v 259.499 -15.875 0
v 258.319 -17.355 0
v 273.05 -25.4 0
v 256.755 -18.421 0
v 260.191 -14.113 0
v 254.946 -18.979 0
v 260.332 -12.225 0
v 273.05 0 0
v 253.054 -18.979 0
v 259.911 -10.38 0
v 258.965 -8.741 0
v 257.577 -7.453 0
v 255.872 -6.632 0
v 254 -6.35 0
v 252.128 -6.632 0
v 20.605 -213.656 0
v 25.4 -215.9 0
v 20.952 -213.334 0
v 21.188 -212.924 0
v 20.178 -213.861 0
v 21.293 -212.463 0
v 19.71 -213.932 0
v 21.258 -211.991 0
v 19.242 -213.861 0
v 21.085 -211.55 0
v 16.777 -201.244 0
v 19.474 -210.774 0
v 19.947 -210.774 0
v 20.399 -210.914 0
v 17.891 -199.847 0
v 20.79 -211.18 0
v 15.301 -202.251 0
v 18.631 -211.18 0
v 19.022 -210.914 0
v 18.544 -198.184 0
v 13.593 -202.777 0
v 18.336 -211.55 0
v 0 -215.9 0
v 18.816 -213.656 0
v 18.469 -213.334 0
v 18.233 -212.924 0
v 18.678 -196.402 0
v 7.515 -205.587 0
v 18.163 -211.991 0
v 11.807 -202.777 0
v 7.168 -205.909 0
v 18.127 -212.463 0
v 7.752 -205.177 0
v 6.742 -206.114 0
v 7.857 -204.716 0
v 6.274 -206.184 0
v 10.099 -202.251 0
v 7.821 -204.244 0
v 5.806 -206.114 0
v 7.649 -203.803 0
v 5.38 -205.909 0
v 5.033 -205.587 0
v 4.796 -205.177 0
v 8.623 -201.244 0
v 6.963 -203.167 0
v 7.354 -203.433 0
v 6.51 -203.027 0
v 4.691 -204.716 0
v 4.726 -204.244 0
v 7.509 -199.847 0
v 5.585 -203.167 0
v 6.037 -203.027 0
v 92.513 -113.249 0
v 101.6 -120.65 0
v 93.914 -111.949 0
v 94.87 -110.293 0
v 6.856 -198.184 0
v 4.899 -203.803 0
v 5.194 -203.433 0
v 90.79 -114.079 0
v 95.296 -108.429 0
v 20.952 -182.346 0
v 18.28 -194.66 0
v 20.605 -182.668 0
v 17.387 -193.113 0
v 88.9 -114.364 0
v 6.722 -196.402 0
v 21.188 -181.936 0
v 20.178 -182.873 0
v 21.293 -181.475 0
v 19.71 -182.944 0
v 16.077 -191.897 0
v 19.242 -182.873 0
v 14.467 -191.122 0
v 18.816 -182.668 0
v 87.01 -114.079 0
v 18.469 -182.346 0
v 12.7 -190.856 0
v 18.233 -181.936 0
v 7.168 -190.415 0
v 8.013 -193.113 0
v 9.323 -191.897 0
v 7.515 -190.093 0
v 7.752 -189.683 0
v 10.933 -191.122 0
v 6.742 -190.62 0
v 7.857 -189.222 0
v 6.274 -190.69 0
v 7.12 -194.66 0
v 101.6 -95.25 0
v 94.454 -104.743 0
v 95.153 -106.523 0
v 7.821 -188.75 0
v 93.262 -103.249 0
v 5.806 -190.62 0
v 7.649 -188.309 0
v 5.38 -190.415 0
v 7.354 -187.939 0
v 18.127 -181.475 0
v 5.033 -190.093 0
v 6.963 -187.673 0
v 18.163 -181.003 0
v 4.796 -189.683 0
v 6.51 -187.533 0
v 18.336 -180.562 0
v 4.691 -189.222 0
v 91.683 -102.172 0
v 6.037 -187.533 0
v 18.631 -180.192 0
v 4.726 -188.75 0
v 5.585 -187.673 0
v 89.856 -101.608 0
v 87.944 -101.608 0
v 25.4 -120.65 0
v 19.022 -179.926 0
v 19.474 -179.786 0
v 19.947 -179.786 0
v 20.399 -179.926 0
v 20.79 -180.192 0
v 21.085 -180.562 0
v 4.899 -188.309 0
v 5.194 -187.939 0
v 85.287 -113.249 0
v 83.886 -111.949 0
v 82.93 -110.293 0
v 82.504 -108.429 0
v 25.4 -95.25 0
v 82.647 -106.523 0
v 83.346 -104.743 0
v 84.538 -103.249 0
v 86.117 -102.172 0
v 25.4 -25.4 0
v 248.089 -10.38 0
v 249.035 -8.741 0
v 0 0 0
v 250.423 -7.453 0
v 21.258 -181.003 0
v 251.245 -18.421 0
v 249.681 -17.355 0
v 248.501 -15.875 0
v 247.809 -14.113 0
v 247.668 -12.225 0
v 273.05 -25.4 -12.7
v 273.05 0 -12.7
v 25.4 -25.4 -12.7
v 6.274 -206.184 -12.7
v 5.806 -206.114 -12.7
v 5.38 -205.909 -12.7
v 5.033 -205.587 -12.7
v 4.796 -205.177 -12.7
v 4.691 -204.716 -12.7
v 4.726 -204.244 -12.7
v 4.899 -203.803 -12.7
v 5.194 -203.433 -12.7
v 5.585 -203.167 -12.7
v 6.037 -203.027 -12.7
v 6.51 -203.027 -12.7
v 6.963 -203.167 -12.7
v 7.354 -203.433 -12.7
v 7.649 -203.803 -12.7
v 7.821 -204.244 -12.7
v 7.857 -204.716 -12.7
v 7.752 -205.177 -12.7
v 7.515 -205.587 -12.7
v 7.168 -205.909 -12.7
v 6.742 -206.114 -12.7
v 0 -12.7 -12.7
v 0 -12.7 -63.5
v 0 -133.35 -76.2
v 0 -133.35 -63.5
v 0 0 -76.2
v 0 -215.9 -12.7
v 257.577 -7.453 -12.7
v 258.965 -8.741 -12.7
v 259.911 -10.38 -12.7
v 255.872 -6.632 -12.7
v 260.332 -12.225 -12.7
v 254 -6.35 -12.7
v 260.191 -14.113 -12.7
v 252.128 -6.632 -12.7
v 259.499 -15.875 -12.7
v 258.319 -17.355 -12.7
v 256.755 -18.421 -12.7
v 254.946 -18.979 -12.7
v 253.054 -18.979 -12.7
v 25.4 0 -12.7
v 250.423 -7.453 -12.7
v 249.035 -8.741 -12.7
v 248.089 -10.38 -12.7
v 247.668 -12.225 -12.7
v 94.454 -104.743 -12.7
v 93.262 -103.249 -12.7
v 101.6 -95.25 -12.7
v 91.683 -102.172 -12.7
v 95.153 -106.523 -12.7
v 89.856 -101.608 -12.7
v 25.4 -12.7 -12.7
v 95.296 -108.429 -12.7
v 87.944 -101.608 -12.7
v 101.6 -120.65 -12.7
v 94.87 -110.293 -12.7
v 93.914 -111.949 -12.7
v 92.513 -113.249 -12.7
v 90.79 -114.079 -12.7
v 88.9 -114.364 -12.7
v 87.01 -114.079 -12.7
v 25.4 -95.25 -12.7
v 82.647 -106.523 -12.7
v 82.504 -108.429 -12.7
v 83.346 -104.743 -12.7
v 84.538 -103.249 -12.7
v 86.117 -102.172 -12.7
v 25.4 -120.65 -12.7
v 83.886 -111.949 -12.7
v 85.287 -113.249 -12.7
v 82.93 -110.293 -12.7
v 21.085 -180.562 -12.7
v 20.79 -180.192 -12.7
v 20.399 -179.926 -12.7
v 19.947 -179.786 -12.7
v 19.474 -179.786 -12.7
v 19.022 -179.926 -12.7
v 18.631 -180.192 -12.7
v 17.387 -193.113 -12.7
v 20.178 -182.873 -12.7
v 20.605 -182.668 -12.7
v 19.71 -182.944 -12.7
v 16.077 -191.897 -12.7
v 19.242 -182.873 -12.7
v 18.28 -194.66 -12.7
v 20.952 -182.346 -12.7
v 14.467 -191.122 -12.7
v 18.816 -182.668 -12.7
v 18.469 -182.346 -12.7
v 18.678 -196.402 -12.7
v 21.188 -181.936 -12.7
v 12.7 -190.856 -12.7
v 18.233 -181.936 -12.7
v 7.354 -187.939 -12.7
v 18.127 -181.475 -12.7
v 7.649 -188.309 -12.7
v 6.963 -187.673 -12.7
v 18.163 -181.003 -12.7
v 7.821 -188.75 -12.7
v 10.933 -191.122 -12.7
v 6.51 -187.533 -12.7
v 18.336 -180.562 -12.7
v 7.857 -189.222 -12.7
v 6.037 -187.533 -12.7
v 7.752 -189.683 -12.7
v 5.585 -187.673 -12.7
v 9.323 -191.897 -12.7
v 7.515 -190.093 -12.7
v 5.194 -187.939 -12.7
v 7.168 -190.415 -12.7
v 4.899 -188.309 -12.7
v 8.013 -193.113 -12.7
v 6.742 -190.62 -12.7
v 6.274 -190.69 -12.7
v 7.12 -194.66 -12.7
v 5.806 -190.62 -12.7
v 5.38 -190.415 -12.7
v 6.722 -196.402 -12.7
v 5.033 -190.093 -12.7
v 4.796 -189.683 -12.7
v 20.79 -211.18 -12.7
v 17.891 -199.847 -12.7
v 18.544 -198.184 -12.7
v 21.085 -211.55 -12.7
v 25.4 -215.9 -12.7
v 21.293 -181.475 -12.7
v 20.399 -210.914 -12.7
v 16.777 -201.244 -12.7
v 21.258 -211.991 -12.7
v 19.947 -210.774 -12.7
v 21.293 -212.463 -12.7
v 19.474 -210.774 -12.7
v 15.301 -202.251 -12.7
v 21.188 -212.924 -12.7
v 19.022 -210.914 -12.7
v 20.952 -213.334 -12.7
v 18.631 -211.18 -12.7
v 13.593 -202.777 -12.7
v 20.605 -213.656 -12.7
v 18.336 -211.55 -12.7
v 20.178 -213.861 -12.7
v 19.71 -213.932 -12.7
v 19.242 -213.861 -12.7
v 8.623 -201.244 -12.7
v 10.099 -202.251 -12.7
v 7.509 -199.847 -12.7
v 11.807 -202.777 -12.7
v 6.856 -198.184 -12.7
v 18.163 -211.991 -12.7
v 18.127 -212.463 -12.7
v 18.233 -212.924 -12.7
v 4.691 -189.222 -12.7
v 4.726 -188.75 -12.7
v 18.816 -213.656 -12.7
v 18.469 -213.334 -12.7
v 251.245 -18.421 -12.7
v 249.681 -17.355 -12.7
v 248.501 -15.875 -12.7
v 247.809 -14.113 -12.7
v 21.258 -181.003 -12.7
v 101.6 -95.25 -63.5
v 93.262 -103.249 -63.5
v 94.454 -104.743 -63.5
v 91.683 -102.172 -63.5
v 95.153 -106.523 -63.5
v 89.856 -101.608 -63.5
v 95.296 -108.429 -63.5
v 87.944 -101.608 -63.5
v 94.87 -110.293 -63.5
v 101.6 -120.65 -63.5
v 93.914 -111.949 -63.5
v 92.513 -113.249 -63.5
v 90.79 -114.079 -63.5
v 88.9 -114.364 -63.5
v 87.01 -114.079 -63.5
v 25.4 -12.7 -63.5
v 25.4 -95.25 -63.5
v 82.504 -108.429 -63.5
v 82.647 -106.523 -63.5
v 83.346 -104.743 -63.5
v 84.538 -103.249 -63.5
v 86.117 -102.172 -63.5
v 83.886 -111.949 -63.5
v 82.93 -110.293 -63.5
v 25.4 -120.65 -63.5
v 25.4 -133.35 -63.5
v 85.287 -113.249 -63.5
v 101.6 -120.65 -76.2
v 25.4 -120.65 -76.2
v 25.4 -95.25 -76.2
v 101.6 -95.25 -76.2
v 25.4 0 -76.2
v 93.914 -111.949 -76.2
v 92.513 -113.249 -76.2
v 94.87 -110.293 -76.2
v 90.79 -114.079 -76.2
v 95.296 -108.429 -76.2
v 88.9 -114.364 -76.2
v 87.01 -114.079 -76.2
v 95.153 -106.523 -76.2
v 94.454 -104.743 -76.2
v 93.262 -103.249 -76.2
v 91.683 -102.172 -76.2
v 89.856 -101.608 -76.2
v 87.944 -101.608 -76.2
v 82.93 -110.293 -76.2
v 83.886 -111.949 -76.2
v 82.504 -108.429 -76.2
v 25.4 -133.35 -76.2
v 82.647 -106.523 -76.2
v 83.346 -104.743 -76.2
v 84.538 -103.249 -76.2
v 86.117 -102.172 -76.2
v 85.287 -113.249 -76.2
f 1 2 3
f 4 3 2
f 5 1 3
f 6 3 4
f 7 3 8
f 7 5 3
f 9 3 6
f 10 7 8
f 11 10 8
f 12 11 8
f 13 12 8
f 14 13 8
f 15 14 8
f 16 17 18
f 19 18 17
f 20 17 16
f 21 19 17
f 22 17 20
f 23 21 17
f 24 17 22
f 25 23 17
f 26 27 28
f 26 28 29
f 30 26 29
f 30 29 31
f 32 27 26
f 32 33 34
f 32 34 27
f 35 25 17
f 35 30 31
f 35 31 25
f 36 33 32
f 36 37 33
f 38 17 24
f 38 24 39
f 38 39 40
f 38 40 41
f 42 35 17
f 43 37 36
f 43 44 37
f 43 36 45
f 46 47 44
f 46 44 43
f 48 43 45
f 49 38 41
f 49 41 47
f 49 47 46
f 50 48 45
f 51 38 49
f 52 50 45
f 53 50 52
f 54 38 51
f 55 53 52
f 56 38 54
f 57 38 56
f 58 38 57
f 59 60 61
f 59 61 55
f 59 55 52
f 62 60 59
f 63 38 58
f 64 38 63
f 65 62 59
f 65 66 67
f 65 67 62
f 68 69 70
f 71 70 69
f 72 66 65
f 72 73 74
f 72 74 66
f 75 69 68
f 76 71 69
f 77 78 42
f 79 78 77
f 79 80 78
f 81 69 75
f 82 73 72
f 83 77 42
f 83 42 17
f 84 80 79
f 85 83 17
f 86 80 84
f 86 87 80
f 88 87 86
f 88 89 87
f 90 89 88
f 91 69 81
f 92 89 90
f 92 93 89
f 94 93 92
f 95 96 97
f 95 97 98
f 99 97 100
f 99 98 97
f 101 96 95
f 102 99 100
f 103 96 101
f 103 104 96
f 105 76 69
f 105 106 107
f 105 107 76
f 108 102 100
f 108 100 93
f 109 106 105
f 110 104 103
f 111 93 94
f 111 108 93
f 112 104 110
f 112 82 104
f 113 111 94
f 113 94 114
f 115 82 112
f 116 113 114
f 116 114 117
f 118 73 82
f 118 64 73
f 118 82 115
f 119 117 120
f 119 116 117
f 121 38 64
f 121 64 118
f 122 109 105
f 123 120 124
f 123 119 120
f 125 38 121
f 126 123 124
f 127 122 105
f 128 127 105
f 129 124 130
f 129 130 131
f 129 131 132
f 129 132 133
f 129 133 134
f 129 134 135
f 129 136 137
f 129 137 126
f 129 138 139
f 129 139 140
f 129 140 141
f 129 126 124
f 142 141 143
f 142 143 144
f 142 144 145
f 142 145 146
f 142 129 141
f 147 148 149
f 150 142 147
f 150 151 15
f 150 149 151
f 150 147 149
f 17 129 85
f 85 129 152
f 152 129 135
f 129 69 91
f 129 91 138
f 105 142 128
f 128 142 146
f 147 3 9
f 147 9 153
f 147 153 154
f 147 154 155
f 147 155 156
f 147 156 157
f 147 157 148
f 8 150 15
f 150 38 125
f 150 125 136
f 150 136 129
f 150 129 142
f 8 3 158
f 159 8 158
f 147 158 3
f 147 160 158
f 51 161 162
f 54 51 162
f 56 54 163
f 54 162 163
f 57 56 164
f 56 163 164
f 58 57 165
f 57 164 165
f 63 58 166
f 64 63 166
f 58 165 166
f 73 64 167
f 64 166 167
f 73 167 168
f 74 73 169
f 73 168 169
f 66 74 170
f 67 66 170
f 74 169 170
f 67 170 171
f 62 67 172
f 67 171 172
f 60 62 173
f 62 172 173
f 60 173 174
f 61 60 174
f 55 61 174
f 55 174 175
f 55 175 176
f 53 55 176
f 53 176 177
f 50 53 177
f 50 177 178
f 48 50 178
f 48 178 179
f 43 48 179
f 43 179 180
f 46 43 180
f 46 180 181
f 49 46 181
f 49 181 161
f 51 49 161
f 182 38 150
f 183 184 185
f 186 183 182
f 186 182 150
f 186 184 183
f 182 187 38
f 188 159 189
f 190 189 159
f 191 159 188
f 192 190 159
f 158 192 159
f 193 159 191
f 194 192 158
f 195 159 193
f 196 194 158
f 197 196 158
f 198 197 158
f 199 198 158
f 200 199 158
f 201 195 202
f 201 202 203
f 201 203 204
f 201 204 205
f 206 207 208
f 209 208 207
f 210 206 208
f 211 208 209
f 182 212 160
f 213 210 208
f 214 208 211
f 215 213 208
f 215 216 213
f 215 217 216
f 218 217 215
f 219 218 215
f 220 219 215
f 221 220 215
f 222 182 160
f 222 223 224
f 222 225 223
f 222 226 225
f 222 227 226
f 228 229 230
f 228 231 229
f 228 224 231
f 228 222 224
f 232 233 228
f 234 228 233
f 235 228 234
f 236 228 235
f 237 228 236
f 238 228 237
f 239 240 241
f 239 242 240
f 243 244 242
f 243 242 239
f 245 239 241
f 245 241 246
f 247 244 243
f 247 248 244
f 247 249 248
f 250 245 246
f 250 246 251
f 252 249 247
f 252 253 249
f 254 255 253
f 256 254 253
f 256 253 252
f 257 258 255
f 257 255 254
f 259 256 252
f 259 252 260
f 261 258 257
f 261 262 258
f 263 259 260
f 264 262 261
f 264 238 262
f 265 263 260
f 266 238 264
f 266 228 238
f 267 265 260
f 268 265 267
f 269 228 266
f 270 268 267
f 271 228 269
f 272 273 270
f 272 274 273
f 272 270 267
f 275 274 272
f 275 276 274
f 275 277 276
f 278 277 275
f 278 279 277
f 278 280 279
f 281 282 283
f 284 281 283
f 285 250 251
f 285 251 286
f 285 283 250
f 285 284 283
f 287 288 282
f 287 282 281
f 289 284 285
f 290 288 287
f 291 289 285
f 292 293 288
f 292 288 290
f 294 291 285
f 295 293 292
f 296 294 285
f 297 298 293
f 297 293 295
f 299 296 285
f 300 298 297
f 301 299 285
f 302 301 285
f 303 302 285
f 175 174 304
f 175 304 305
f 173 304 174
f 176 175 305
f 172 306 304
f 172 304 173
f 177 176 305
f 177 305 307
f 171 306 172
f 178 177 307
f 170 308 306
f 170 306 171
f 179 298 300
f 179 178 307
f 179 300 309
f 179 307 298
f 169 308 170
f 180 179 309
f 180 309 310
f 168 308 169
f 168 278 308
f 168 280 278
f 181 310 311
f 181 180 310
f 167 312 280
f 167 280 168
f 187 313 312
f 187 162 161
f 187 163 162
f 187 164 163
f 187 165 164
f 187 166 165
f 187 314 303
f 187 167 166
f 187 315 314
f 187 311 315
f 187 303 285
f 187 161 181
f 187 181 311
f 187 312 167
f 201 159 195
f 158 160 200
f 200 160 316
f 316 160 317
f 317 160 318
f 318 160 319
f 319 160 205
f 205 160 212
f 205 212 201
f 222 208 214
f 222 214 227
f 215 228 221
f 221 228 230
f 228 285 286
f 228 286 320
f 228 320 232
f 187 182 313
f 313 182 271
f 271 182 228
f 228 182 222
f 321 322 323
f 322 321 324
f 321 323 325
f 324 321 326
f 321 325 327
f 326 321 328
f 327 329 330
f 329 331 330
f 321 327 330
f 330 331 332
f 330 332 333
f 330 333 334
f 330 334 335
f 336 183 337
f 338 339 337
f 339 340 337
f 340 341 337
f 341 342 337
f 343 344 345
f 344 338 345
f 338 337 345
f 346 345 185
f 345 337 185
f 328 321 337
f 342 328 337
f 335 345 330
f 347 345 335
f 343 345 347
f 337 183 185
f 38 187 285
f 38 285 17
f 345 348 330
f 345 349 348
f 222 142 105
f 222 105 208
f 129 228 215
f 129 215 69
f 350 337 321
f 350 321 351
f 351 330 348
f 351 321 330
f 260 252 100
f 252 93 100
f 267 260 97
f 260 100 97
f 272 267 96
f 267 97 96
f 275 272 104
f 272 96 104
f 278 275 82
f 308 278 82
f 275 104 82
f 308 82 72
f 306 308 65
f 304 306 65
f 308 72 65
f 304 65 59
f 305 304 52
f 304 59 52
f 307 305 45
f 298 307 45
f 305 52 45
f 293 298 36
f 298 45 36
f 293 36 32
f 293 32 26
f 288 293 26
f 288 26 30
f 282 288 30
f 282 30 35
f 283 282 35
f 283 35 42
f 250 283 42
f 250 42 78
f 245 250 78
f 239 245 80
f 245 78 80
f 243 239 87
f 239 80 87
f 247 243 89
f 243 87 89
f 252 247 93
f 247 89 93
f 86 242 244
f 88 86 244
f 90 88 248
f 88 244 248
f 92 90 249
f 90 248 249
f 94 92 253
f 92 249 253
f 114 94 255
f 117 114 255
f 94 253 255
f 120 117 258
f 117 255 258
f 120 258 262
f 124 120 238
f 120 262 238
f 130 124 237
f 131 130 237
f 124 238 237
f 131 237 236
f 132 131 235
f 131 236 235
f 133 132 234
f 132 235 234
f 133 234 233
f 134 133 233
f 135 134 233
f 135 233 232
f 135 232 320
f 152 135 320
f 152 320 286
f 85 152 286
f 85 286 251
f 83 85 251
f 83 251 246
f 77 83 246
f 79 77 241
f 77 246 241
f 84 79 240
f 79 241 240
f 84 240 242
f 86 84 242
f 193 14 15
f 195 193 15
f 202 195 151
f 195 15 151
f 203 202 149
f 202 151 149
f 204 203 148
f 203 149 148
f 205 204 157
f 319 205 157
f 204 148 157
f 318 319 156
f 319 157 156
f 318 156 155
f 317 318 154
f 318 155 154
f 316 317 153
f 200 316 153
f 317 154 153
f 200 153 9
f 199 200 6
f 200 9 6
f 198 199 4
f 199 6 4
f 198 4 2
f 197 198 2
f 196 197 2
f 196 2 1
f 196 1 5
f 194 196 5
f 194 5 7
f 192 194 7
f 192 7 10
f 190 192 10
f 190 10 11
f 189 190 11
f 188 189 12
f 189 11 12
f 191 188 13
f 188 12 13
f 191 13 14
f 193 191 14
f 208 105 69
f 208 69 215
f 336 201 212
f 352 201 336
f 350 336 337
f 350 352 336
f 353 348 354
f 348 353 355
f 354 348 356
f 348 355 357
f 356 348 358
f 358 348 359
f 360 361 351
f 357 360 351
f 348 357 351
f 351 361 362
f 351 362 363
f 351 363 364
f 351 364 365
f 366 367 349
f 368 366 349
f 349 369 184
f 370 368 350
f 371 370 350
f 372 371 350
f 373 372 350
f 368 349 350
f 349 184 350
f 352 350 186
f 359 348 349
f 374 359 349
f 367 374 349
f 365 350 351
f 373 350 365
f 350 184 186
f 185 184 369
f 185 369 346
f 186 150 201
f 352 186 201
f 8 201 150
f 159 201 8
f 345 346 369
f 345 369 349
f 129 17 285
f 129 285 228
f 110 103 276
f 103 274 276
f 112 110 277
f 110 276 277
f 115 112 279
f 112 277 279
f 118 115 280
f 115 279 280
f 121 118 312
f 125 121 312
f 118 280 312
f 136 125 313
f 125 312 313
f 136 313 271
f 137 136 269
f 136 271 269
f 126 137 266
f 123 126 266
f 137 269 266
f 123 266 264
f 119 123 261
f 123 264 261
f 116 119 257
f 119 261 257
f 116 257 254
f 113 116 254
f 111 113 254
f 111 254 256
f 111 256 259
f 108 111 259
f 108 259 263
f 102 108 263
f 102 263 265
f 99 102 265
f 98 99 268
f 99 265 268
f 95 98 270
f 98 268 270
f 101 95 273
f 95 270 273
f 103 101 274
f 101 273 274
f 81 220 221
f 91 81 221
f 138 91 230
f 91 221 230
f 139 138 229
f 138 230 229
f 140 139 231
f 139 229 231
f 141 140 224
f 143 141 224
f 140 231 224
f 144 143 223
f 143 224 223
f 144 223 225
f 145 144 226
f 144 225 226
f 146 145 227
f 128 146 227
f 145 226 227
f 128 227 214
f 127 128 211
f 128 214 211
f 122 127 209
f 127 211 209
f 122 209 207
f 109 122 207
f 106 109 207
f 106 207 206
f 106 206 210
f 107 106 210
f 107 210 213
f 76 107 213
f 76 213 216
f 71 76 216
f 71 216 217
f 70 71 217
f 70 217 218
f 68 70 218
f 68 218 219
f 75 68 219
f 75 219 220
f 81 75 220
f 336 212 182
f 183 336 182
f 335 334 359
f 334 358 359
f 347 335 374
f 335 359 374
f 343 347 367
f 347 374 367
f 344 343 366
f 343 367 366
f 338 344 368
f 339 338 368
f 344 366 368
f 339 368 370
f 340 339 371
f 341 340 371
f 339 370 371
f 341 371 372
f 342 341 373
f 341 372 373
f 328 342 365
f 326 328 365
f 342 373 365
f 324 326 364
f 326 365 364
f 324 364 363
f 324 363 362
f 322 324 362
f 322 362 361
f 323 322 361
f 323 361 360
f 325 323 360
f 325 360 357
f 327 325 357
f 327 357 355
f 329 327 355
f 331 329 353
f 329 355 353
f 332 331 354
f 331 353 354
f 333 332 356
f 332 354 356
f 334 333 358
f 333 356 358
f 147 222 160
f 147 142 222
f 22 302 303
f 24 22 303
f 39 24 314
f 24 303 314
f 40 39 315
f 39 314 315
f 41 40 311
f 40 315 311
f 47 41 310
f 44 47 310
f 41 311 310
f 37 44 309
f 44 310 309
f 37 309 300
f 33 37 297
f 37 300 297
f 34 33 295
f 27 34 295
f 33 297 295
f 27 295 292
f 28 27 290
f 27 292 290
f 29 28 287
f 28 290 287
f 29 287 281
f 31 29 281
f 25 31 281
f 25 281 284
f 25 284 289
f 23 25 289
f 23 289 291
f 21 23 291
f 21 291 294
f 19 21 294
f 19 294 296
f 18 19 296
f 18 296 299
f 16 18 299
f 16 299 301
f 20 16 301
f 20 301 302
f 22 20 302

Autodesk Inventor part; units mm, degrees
ref_plane "YZ Plane" through (0, 0, 0) normal (1, 0, 0) x (0, 1, 0)
ref_plane "XZ Plane" through (0, 0, 0) normal (0, 1, 0) x (-1, 0, 0)
sketch "Sketch1" plane through (0, 0, 0) normal (1, 0, 0) x (0, 1, 0)
  line L0 (0, 0) -> (-228.6, 0)
  line L1 (-228.6, 0) -> (-228.6, -12.7)
  line L2 (-228.6, -12.7) -> (0, -12.7)
  line L3 (0, -12.7) -> (0, 0)
  line L4 (0, -12.7) -> (-88.9, -12.7)
  line L5 (-88.9, -63.5) -> (0, -63.5)
  line L6 (0, -63.5) -> (-228.6, -63.5)
  line L7 (-228.6, -63.5) -> (-228.6, -76.2)
  line L8 (-228.6, -76.2) -> (0, -76.2)
  line L9 (0, -76.2) -> (0, -63.5)
  line L10 (-228.6, 0) -> (-215.9, 0)
  line L11 (-215.9, 0) -> (-215.9, -76.2)
  line L12 (-215.9, -76.2) -> (-228.6, -76.2)
  line L13 (-228.6, -76.2) -> (-228.6, 0)
  dimension "d1" = 12.7
  dimension "d4" = 12.7
  dimension "d63" = 12.7
  dimension "d64" = 228.6
  dimension "d65" = 228.6
  dimension "d66" = 50.8
extrude "Extrusion1" add sketch "Sketch1" along normal blind 25.4
sketch "Sketch3" plane through (0, -228.6, -76.2) normal (0, 0, -1) x (-1, 0, 0)
  line L0 (0, 0) -> (0, 228.6) projected
  line L1 (0, 228.6) -> (-25.4, 228.6) projected
  line L2 (-25.4, 0) -> (-25.4, 228.6) projected
  line L3 (0, 0) -> (-25.4, 0) projected
  point P0 (0, 228.6)
  point P1 (-12.7, 31.75)
  dimension "d18" = 25.4
  dimension "d19" = 12.7
  dimension "d20" = 31.75
hole "Hole2" at (12.7, -196.85, -76.2) direction (0, 0, 1) diameter 11.9888 end through all
sketch "Sketch5" plane through (25.4, 0, 0) normal (1, 0, 0) x (0, 0, -1)
  line L0 (0, 0) -> (12.7, 0)
  line L1 (12.7, 0) -> (12.7, -25.4)
  line L2 (12.7, -25.4) -> (0, -25.4)
  line L3 (0, -25.4) -> (0, 0)
  line L4 (0, 0) -> (0, -228.6) projected
  line L5 (12.7, 0) -> (0, 0) projected
  dimension "d39" = 12.7
  dimension "d67" = 25.4
  dimension "d68" = 0
  dimension "d69" = 0
extrude "Extrusion2" add sketch "Sketch5" along normal blind 247.65
sketch "Sketch9" plane through (25.4, 0, 0) normal (1, 0, 0) x (0, 0, -1)
  line L0 (12.7, -215.9) -> (12.7, -25.4) projected
  line L1 (0, -95.25) -> (12.7, -95.25)
  line L2 (12.7, -95.25) -> (12.7, -120.65)
  line L3 (12.7, -120.65) -> (0, -120.65)
  line L4 (0, -120.65) -> (0, -95.25)
  line L5 (0, -25.4) -> (0, -228.6) projected
  line L6 (0, -25.4) -> (12.7, -25.4) projected
  point P0 (0, 0)
  dimension "d81" = 25.4
  dimension "d83" = 12.7
  dimension "d84" = 12.7
  dimension "d85" = 69.85
extrude "Extrusion3" add sketch "Sketch9" along normal blind 76.2 contours L3 L4 L1 L0
sketch "Sketch8" plane through (0, -215.9, -12.7) normal (0, 0, -1) x (-1, 0, 0)
  line L0 (-273.05, 190.5) -> (-273.05, 215.9) projected
  line L1 (0, 215.9) -> (-273.05, 215.9) projected
  point P0 (-254, 203.2)
  dimension "d70" = 19.05
  dimension "d71" = 25.4
  dimension "d72" = 12.7
hole "Hole6" at (254, -12.7, -12.7) direction (0, 0, 1) diameter 12.7 end through all
ref_plane "Work Plane1" through (0, -215.9, -38.1) normal (0, 0, 1) x (1, 0, 0)
mirror "Mirror1" about plane through (0, -215.9, -38.1) normal (0, 0, 1) of "Extrusion3"
sketch "Sketch10" plane through (0, -228.6, 0) normal (0, 0, 1) x (1, 0, 0)
  line L0 (25.4, 133.35) -> (101.6, 133.35) projected
  line L1 (25.4, 107.95) -> (101.6, 107.95) projected
  line L2 (101.6, 133.35) -> (101.6, 107.95) projected
  point P0 (0, 228.6)
  point P1 (88.9, 120.65)
  dimension "d89" = 25.4
  dimension "d90" = 12.7
  dimension "d91" = 12.7
hole "Hole7" at (88.9, -107.95, 0) direction (0, 0, -1) diameter 12.827 end through all
sketch "Sketch11" plane through (0, -215.9, -63.5) normal (0, 0, 1) x (1, 0, 0)
  line L0 (0, 215.9) -> (25.4, 215.9) projected
  line L1 (25.4, 215.9) -> (25.4, 120.65) projected
  line L2 (0, 215.9) -> (25.4, 215.9)
  line L3 (25.4, 215.9) -> (25.4, 203.2)
  line L4 (25.4, 203.2) -> (0, 203.2)
  line L5 (0, 203.2) -> (0, 215.9)
  dimension "d99" = 12.7
extrude "Extrusion4" add sketch "Sketch11" along normal up to surface (50.8 mm away)
sketch "Sketch12" plane through (25.4, 0, 0) normal (1, 0, 0) x (0, 0, -1)
  line L0 (76.2, -228.6) -> (76.2, 0) projected
  line L1 (76.2, -133.35) -> (63.5, -133.35)
  line L2 (63.5, -12.7) -> (63.5, -215.9) projected
  line L3 (76.2, -120.65) -> (63.5, -120.65) projected
  line L4 (12.7, -215.9) -> (12.7, -12.7) projected
  line L5 (0, 0) -> (0, -228.6) projected
  line L6 (76.2, -120.65) -> (63.5, -120.65) projected
  line L7 (63.5, -120.65) -> (63.5, -215.9) projected
  line L8 (63.5, -215.9) -> (12.7, -215.9) projected
  line L9 (12.7, -215.9) -> (12.7, -120.65) projected
  line L10 (12.7, -120.65) -> (0, -120.65) projected
  line L11 (0, -120.65) -> (0, -228.6) projected
  line L12 (0, -228.6) -> (76.2, -228.6) projected
  line L13 (76.2, -228.6) -> (76.2, -120.65) projected
  line L14 (12.7, -215.9) -> (0, -215.9)
  dimension "d102" = 12.7
extrude "Extrusion5" cut sketch "Sketch12" against normal blind 50.8 contours L12 L5 L14 L8 L2 L1 L0
sketch "Sketch13" plane through (0, 0, 0) normal (0, 0, 1) x (1, 0, 0)
  circle A0 centre (12.7, -196.85) radius 5.9944 projected
  point P0 (0, 0)
  point P1 (6.2738, -189.103)
  point P2 (19.7104, -181.356)
  point P3 (19.7104, -212.344)
  point P4 (6.2738, -204.597)
  dimension "d105" = 7.747
  dimension "d106" = 6.4262
  dimension "d107" = 7.0104
  dimension "d108" = 15.494
  dimension "d109" = 15.494
  dimension "d110" = 7.0104
  dimension "d111" = 7.747
  dimension "d112" = 6.4262
hole "Hole8" at (6.2738, -189.103, 0) at (19.7104, -181.356, 0) at (19.7104, -212.344, 0) at (6.2738, -204.597, 0) direction (0, 0, -1) diameter 3.175 end through all
equation "\"d4\" = d1"
equation "\"d65\" = d64"
equation "\"d19\" = 0.5 * d18"
equation "\"d84\" = d83"
equation "\"d72\" = 0.5 * d71"
equation "\"d90\" = 0.5 * d89"
equation "\"d109\" = d108"
equation "\"d110\" = d107"
equation "\"d111\" = d105"
equation "\"d112\" = d106"
properties part number "shooter" material "Aluminum 6061"
